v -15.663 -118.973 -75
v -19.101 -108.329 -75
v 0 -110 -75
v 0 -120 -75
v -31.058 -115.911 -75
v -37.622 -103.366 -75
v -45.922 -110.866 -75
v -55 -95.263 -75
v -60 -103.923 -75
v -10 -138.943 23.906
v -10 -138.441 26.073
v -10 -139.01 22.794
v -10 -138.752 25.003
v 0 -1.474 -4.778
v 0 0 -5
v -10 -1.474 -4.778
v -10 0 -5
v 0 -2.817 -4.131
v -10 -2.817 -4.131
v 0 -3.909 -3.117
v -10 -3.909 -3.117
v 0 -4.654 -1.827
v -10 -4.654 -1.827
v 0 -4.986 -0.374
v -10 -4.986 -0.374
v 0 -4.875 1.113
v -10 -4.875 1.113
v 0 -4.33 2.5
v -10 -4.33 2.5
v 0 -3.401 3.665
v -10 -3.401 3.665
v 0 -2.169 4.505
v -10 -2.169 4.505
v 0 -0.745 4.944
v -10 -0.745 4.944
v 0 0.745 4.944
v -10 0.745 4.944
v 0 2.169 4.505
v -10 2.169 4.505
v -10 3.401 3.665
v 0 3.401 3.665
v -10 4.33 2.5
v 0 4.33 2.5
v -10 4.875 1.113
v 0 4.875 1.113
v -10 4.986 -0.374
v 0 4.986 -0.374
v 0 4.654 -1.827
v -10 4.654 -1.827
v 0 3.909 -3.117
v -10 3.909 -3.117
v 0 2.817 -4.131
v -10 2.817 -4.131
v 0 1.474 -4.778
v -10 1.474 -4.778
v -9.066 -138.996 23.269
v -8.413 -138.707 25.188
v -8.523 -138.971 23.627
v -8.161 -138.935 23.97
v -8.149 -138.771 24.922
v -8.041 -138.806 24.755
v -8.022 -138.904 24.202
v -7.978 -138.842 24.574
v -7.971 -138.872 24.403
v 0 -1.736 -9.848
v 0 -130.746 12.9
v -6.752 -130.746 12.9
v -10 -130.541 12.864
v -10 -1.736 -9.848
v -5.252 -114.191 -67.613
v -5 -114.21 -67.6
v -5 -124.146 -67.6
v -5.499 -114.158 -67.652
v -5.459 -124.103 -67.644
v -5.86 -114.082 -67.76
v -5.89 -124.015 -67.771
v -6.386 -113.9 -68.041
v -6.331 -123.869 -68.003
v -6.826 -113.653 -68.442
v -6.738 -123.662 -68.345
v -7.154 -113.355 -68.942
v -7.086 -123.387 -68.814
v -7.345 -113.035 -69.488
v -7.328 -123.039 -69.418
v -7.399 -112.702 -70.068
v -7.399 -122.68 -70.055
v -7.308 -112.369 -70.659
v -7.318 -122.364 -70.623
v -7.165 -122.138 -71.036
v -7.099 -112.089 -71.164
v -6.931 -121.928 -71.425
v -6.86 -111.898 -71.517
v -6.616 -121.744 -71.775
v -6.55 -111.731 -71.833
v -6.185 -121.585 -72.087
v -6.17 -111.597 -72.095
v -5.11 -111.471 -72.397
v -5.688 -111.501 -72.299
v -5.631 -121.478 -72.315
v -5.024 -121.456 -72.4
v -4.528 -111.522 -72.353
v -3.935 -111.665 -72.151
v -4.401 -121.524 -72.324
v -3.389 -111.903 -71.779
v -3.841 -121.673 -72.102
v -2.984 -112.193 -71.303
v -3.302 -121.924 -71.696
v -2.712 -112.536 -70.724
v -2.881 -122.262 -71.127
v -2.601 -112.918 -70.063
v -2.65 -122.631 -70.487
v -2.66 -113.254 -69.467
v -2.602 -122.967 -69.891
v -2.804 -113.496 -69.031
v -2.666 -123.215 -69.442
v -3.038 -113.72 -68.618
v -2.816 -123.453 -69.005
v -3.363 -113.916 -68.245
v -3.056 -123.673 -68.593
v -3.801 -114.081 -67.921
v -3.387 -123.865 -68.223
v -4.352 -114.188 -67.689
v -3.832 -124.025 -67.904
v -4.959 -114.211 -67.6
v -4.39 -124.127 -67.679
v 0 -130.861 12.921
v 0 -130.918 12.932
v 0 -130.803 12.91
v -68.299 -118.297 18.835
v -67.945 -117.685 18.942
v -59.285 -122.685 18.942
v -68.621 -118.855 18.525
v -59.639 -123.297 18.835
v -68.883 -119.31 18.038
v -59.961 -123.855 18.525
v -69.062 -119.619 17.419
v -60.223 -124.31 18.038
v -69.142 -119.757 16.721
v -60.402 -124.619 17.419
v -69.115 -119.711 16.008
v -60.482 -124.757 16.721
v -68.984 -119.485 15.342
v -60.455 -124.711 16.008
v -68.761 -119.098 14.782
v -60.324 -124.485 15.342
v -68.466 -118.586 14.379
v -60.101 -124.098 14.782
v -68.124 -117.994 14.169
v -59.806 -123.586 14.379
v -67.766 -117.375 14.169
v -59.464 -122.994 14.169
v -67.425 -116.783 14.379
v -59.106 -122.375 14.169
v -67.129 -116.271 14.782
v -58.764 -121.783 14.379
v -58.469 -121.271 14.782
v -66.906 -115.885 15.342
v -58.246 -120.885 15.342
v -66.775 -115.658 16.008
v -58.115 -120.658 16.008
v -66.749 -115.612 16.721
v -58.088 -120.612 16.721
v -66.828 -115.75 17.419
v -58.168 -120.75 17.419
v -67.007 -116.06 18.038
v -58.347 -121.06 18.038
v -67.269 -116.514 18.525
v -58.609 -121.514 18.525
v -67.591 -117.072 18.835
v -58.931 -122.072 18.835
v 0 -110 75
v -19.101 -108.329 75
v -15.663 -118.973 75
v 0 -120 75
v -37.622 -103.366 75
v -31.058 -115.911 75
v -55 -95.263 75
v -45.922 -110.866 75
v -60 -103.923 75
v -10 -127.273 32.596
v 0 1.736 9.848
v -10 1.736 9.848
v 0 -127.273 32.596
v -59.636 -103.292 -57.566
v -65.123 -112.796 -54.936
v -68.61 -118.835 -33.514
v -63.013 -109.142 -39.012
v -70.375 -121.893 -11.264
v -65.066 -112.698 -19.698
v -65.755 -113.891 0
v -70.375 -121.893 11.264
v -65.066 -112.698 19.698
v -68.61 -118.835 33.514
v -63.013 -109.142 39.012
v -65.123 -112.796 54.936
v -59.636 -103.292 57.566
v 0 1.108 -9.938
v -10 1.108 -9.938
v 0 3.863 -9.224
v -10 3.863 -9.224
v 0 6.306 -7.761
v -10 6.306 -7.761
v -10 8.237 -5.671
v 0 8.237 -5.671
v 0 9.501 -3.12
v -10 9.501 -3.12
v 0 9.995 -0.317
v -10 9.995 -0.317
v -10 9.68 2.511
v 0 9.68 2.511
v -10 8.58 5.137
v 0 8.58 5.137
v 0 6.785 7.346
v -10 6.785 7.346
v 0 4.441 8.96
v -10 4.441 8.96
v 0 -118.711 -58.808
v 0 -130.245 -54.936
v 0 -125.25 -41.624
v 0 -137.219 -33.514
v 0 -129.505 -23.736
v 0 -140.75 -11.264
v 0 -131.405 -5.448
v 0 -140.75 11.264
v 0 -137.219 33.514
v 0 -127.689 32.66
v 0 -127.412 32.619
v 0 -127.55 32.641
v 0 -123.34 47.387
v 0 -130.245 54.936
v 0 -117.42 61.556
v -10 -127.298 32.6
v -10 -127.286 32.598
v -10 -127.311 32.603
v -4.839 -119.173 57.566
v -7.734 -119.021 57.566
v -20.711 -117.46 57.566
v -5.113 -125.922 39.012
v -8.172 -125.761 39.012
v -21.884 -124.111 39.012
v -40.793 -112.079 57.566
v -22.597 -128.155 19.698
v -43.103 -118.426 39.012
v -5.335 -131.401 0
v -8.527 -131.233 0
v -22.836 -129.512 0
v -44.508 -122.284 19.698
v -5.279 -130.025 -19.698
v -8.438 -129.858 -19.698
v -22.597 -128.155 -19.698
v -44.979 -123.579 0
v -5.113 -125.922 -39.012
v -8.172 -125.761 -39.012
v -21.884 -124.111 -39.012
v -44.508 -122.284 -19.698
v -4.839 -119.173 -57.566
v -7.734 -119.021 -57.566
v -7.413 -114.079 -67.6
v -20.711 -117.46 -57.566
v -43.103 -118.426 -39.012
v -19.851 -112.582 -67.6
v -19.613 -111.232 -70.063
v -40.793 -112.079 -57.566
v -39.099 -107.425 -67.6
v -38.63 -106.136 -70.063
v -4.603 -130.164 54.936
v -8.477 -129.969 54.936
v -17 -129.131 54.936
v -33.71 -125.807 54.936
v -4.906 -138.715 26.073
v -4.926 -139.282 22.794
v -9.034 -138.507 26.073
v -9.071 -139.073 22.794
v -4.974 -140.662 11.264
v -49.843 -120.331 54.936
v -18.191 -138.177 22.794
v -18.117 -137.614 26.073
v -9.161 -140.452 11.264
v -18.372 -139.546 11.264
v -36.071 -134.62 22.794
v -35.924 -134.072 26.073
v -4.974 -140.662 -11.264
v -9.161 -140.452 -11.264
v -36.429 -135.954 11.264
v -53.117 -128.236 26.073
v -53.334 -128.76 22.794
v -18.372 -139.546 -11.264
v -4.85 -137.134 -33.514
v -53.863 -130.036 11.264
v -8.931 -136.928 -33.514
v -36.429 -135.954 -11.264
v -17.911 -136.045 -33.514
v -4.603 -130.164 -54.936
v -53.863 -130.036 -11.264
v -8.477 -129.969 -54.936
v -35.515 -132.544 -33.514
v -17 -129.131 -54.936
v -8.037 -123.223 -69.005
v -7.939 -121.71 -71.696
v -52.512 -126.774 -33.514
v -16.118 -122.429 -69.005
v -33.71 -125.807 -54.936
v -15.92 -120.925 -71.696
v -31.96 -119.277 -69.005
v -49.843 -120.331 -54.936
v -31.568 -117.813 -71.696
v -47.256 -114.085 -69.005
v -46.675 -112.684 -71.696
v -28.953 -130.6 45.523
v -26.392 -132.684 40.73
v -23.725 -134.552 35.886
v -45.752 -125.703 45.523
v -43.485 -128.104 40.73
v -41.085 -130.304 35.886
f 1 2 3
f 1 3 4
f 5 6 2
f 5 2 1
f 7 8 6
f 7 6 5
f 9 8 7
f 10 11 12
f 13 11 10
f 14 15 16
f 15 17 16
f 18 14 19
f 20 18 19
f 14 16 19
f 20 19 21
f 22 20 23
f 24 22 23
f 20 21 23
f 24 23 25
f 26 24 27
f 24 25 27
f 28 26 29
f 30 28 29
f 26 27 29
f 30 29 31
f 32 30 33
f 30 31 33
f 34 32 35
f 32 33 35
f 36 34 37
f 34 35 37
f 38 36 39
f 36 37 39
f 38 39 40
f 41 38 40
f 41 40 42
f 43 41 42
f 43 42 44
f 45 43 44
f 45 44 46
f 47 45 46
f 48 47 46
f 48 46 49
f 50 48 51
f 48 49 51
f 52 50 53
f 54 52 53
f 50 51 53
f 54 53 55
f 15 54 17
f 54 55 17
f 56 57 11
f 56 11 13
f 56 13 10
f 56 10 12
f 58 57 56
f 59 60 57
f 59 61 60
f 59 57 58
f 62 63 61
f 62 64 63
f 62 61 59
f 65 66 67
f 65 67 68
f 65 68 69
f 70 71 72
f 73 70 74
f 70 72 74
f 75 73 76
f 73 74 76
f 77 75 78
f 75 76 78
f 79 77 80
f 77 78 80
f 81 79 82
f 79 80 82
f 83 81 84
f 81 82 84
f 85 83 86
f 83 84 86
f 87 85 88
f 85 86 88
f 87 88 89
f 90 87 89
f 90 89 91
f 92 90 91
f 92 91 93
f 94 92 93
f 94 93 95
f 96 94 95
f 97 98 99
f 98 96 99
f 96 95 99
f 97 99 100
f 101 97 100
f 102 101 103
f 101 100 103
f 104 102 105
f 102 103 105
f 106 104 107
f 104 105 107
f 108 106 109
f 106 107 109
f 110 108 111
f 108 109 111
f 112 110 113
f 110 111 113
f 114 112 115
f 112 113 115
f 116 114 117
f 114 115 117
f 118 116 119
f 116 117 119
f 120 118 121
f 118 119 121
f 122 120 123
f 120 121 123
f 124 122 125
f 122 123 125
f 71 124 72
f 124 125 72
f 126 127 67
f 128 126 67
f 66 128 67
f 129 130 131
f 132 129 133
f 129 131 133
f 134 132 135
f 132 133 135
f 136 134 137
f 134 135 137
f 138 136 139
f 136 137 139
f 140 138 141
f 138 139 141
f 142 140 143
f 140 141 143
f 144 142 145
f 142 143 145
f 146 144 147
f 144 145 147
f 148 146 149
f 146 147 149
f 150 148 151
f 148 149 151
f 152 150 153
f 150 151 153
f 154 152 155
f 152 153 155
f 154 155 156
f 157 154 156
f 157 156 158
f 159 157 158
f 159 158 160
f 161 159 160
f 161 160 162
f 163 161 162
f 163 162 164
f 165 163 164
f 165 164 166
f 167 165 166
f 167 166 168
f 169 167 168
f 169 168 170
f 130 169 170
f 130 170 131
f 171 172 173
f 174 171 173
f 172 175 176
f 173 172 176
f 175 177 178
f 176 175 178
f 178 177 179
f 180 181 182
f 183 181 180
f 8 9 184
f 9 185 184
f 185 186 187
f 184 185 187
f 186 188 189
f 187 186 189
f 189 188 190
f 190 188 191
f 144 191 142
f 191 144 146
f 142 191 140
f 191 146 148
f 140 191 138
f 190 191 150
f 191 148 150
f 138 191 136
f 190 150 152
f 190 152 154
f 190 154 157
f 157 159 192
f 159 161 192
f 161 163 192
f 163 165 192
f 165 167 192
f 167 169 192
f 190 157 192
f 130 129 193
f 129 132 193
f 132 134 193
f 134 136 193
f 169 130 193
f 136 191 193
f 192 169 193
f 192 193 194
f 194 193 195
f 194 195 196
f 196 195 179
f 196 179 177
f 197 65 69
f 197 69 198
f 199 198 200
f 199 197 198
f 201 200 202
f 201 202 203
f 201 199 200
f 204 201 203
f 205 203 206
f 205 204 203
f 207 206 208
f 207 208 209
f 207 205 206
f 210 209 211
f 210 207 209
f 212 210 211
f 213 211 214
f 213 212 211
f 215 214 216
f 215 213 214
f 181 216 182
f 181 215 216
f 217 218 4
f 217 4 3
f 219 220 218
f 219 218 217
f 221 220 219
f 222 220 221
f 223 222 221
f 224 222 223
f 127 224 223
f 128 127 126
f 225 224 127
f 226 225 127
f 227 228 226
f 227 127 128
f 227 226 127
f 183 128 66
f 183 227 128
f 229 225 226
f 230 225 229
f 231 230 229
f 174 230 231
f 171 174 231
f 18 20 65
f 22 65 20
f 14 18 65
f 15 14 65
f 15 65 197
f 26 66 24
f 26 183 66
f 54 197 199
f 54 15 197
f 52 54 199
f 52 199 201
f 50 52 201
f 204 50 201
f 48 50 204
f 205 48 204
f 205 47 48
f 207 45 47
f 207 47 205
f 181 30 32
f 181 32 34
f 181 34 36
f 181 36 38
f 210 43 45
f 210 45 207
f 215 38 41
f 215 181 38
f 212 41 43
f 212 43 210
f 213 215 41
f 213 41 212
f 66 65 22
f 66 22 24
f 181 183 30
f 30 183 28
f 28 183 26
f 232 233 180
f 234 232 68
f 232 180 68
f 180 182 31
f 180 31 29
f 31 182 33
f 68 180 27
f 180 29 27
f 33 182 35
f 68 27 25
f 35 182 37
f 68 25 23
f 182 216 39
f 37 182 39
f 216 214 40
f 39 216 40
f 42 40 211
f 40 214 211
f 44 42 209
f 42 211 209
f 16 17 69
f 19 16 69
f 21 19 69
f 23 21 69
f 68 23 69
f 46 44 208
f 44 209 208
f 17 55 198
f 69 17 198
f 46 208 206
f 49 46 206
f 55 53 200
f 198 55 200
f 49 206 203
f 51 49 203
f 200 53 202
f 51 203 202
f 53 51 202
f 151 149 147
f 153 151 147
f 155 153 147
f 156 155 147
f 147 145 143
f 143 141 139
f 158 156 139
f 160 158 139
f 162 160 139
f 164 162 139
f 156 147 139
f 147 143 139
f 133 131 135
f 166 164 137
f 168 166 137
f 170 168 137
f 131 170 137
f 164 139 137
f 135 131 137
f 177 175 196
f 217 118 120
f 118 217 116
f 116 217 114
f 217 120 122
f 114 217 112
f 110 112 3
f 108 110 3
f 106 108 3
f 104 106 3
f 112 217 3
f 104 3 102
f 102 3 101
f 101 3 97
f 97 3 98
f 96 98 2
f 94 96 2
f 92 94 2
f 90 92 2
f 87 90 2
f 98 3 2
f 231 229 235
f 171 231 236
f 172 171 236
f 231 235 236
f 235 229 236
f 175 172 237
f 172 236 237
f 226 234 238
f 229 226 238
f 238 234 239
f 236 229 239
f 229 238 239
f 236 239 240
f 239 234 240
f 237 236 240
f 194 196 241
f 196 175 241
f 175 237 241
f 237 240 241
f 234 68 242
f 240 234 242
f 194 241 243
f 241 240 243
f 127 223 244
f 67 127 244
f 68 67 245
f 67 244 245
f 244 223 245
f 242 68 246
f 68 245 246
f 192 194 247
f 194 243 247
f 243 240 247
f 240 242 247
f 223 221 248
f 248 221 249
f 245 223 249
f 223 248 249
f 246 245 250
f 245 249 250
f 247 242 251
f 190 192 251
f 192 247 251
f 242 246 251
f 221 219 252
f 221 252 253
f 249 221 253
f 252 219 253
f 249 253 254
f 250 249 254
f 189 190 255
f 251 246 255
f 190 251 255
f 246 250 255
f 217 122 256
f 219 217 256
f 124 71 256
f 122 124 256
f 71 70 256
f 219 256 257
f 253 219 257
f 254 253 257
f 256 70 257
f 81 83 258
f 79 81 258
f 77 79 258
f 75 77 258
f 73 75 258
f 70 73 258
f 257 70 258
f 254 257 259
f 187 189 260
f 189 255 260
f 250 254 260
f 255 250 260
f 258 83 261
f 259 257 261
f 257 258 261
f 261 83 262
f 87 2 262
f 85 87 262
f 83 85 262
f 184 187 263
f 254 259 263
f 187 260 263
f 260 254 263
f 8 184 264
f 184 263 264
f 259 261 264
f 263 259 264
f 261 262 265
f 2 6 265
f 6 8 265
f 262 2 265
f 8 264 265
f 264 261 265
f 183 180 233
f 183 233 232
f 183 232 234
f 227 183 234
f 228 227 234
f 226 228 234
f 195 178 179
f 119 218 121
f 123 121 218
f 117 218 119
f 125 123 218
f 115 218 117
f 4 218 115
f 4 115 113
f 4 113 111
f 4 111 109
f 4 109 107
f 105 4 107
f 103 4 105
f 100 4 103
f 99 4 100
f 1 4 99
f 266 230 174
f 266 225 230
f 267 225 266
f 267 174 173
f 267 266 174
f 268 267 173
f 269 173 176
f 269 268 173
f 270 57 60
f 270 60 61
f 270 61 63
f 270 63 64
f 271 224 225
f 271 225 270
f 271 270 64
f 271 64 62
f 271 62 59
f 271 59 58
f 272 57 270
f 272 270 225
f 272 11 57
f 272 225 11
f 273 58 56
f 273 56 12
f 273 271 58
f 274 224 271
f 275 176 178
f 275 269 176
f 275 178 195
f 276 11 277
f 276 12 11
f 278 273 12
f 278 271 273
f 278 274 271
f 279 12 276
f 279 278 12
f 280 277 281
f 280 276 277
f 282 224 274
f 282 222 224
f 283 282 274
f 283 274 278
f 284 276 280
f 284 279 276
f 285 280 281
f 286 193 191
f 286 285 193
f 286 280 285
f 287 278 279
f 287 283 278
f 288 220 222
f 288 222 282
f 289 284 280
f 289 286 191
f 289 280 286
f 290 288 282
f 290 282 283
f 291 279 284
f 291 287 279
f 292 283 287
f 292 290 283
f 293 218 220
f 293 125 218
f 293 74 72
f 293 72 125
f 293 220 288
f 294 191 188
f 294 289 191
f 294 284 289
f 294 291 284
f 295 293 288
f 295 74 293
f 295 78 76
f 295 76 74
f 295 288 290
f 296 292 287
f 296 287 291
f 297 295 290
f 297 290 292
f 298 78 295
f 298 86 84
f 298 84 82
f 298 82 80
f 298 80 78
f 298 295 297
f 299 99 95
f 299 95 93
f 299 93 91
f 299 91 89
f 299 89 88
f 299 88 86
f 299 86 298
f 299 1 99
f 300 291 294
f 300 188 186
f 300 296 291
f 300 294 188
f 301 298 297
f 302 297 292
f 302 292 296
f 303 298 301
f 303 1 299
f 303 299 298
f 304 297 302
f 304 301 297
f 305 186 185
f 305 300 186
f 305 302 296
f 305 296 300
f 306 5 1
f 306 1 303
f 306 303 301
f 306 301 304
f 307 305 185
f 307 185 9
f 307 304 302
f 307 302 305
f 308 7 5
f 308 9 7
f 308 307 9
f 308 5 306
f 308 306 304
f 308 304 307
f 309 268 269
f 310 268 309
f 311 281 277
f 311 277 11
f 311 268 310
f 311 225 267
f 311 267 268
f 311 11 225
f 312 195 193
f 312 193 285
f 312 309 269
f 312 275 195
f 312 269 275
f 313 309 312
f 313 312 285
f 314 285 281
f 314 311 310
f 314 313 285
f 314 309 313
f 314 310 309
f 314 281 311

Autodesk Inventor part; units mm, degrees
ref_plane "YZ Plane" through (0, 0, 0) normal (1, 0, 0) x (0, 1, 0)
ref_plane "XZ Plane" through (0, 0, 0) normal (0, 1, 0) x (-1, 0, 0)
ref_plane "XY Plane" through (0, 0, 0) normal (0, 0, 1) x (1, 0, 0)
sketch "スケッチ1" plane through (0, 0, 0) normal (1, 0, 0) x (0, 1, 0)
  line L0 (-110, 0) -> (-125, 0)
  line L1 (-110, 75) -> (-120, 75)
  arc A0 (-120, 75) -> (-120, -75) centre (2.1096, 0) ccw
  line L2 (0, 75) -> (0, -75)
  line L3 (-110, -75) -> (-120, -75)
  arc A1 (-110, 75) -> (-110, -75) centre (10, 0) ccw
  point P0 (0, 0)
  point P1 (0, 0)
  dimension "d0" = 150
  dimension "d2" = 0
  dimension "d4" = 10
  dimension "d35" = 20
revolve "回転1" add sketch "スケッチ1" angle 30 about axis through (0, 0, 75) along (0, 0, -1)
sketch "スケッチ2" plane through (0, -120, -75) normal (1, 0, 0) x (0, 0, -1)
  line L0 (-75, 120) -> (-97.7479, -9.0098) construction
  line L1 (-84.8481, 121.7365) -> (-107.596, -7.2733)
  line L2 (-87.8998, -10.7463) -> (-65.1519, 118.2635)
  arc A0 (-65.1519, 118.2635) -> (-84.8481, 121.7365) centre (-75, 120) ccw
  arc A1 (-107.596, -7.2733) -> (-87.8998, -10.7463) centre (-97.7479, -9.0098) ccw
  line L3 (-75, 120) -> (56, 120) construction
  point P0 (-86.374, 55.4951)
  dimension "d6" = 131
  dimension "d7" = 100
  dimension "d8" = 20
extrude "押し出し1" add sketch "スケッチ2" against normal blind 10
sketch "スケッチ3" plane through (0, -120, 75) normal (1, 0, 0) x (0, 0, -1)
  point P0 (75, 120)
  point P1 (75, 120)
hole "穴1" at (0, 0, 0) direction (-1, 0, 0) diameter 10 end through all
sketch "スケッチ5" plane through (1.0548, 1.8269, 0) normal (-0.8660254, 0.5, 0) x (-0.5, -0.8660254, 0)
  ellipse E0 centre (7.1096, 0) end of major axis (7.1096, -5) minor radius 4.3301 projected
  line L0 (7.1096, 0) -> (186.6716, 22.6929)
  arc A0 (122.1096, -75) -> (122.1096, 75) centre (0, 0) ccw projected
  point P0 (2.1096, 0)
  point P1 (138, 16.5418)
  dimension "d27" = 138
hole "穴3" at (-67.9452, -117.6846, 16.5418) direction (0.8660254, -0.5, 0) diameter 4.8 depth 10
sketch "スケッチ6" plane through (0, 0, 0) normal (0, 1, 0) x (-1, 0, 0)
  line L0 (0, -75) -> (0, 12.9316) projected
  line L1 (0, -75) -> (55, -75) projected
  point P0 (0, 0)
  point P1 (5, -70)
  dimension "d36" = 5
  dimension "d37" = 5
hole "穴4" at (-5, 0, -70) direction (0, -1, 0) diameter 4.8 end through all
properties part number "受動歩行_ver4"
